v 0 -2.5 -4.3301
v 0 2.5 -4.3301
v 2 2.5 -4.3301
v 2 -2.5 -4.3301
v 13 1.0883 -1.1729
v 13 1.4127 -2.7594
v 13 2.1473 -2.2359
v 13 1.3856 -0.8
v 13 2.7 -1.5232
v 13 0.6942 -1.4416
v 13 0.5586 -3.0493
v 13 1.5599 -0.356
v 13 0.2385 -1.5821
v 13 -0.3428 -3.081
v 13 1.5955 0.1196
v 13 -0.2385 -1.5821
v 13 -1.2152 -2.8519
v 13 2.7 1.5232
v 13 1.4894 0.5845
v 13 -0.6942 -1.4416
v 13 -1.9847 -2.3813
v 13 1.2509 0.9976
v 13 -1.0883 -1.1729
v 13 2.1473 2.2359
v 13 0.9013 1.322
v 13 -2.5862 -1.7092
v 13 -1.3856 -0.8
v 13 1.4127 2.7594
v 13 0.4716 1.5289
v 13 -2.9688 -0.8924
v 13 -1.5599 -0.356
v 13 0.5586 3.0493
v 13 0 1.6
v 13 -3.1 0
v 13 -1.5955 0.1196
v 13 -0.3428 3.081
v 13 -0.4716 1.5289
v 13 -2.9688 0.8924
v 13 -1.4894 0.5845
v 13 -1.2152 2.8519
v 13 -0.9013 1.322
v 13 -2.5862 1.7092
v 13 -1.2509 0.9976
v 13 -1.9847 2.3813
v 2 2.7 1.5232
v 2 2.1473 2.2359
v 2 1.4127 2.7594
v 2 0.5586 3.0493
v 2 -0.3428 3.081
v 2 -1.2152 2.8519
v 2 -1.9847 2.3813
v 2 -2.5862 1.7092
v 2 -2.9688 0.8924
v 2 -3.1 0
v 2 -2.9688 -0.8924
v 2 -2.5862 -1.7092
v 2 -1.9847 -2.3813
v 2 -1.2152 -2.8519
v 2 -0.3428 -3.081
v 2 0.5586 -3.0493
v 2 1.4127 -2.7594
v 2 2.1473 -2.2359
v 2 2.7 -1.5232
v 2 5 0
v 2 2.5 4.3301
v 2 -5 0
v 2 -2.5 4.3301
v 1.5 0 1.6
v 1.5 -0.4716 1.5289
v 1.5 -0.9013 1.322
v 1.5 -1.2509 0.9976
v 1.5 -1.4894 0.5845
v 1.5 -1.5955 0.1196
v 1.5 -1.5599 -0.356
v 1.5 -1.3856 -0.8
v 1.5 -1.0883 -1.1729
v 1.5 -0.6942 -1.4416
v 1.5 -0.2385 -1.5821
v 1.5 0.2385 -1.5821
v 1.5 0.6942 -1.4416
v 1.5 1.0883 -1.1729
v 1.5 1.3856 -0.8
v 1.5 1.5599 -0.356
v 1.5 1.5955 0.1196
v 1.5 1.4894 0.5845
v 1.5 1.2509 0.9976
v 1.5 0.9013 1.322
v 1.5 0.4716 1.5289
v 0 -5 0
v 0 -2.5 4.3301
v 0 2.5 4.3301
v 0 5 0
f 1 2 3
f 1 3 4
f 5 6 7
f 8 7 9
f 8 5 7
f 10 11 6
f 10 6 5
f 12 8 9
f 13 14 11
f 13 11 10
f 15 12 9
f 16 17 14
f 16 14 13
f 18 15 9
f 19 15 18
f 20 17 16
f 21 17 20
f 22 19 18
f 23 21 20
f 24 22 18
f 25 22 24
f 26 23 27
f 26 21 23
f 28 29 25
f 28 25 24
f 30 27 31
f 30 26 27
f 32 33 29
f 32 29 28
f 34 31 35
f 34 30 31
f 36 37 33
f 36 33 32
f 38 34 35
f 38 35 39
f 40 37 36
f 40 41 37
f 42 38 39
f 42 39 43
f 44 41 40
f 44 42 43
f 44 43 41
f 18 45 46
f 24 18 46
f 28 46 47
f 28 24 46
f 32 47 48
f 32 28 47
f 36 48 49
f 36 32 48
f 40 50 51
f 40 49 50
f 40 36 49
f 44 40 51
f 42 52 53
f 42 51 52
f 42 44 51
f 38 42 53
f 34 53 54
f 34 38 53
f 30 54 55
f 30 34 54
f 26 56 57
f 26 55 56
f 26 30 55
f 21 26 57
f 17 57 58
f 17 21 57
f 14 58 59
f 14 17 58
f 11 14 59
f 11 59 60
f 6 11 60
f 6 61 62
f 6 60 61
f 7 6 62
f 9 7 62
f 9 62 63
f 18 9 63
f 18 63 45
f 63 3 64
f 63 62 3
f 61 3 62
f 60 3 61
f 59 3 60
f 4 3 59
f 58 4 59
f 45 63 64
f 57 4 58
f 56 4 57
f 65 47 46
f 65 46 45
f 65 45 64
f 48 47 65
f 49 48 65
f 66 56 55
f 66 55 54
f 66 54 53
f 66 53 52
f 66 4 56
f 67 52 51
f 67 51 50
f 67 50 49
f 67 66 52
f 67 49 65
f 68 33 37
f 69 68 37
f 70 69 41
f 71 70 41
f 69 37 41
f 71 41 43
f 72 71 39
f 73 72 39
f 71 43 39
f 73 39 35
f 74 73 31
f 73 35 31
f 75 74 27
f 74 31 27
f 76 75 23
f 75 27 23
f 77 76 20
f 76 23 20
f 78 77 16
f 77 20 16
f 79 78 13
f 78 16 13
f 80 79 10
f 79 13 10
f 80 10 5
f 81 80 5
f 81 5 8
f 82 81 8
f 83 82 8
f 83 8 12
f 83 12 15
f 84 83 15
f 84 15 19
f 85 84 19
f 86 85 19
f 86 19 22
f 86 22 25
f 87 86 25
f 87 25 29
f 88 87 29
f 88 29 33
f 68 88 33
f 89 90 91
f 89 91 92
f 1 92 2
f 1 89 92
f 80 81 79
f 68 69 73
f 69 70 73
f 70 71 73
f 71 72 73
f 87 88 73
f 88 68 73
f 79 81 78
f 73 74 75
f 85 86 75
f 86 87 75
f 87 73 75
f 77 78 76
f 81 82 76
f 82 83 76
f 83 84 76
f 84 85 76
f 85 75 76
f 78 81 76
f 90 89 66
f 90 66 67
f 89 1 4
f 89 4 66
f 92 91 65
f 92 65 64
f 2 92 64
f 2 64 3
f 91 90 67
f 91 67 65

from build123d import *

# Parameters (mm, degrees)
SKETCH2_OUTSIDE_W  = 15.842
SKETCH2_OUTSIDE_H  = 15.842
CUT_EXTRUDE1_DEPTH = 10
SHELL1_T           = -1.5
CUT_EXTRUDE2_DEPTH = 11


with BuildPart() as part:
    # Sketch1 → Revolve1 (revolve)
    with BuildSketch(Plane.XY, mode=Mode.PRIVATE) as revolve1_sk:
        Polygon((0, 0), (0, 5), (2, 5), (2, 3.1), (13, 3.1), (13, 0), align=None)
    revolve(revolve1_sk.sketch.rotate(Axis((0, 0, 0), (1, 0, 0)), 90), axis=Axis((0, 0, 0), (1, 0, 0)))

    # Sketch2 outside → Cut-Extrude1 (cut)
    with BuildSketch(Plane.ZY):
        Rectangle(SKETCH2_OUTSIDE_W, SKETCH2_OUTSIDE_H)
        Polygon((0, -5), (4.330127019, -2.5), (4.330127019, 2.5), (0, 5), (-4.330127019, 2.5), (-4.330127019, -2.5), align=None, mode=Mode.SUBTRACT)
    extrude(amount=-CUT_EXTRUDE1_DEPTH, mode=Mode.SUBTRACT)

    # Shell1
    shell1_openings = [part.faces().sort_by_distance(p)[0] for p in [
        (13, 0, 0),
    ]]
    offset(amount=SHELL1_T, openings=shell1_openings, kind=Kind.INTERSECTION)

    # Sketch3 → Cut-Extrude2 (cut)
    with BuildSketch(Plane(origin=(13, 0, 0), x_dir=(0, 0, -1), z_dir=(1, 0, 0))):
        with BuildLine():
            Line((1.523154621, 2.7), (-1.523154621, 2.7))
            ThreePointArc((-1.523154621, 2.7), (0, 3.1), (1.523154621, 2.7))
        make_face()
    extrude(amount=-CUT_EXTRUDE2_DEPTH, mode=Mode.SUBTRACT)


solid = part.part
